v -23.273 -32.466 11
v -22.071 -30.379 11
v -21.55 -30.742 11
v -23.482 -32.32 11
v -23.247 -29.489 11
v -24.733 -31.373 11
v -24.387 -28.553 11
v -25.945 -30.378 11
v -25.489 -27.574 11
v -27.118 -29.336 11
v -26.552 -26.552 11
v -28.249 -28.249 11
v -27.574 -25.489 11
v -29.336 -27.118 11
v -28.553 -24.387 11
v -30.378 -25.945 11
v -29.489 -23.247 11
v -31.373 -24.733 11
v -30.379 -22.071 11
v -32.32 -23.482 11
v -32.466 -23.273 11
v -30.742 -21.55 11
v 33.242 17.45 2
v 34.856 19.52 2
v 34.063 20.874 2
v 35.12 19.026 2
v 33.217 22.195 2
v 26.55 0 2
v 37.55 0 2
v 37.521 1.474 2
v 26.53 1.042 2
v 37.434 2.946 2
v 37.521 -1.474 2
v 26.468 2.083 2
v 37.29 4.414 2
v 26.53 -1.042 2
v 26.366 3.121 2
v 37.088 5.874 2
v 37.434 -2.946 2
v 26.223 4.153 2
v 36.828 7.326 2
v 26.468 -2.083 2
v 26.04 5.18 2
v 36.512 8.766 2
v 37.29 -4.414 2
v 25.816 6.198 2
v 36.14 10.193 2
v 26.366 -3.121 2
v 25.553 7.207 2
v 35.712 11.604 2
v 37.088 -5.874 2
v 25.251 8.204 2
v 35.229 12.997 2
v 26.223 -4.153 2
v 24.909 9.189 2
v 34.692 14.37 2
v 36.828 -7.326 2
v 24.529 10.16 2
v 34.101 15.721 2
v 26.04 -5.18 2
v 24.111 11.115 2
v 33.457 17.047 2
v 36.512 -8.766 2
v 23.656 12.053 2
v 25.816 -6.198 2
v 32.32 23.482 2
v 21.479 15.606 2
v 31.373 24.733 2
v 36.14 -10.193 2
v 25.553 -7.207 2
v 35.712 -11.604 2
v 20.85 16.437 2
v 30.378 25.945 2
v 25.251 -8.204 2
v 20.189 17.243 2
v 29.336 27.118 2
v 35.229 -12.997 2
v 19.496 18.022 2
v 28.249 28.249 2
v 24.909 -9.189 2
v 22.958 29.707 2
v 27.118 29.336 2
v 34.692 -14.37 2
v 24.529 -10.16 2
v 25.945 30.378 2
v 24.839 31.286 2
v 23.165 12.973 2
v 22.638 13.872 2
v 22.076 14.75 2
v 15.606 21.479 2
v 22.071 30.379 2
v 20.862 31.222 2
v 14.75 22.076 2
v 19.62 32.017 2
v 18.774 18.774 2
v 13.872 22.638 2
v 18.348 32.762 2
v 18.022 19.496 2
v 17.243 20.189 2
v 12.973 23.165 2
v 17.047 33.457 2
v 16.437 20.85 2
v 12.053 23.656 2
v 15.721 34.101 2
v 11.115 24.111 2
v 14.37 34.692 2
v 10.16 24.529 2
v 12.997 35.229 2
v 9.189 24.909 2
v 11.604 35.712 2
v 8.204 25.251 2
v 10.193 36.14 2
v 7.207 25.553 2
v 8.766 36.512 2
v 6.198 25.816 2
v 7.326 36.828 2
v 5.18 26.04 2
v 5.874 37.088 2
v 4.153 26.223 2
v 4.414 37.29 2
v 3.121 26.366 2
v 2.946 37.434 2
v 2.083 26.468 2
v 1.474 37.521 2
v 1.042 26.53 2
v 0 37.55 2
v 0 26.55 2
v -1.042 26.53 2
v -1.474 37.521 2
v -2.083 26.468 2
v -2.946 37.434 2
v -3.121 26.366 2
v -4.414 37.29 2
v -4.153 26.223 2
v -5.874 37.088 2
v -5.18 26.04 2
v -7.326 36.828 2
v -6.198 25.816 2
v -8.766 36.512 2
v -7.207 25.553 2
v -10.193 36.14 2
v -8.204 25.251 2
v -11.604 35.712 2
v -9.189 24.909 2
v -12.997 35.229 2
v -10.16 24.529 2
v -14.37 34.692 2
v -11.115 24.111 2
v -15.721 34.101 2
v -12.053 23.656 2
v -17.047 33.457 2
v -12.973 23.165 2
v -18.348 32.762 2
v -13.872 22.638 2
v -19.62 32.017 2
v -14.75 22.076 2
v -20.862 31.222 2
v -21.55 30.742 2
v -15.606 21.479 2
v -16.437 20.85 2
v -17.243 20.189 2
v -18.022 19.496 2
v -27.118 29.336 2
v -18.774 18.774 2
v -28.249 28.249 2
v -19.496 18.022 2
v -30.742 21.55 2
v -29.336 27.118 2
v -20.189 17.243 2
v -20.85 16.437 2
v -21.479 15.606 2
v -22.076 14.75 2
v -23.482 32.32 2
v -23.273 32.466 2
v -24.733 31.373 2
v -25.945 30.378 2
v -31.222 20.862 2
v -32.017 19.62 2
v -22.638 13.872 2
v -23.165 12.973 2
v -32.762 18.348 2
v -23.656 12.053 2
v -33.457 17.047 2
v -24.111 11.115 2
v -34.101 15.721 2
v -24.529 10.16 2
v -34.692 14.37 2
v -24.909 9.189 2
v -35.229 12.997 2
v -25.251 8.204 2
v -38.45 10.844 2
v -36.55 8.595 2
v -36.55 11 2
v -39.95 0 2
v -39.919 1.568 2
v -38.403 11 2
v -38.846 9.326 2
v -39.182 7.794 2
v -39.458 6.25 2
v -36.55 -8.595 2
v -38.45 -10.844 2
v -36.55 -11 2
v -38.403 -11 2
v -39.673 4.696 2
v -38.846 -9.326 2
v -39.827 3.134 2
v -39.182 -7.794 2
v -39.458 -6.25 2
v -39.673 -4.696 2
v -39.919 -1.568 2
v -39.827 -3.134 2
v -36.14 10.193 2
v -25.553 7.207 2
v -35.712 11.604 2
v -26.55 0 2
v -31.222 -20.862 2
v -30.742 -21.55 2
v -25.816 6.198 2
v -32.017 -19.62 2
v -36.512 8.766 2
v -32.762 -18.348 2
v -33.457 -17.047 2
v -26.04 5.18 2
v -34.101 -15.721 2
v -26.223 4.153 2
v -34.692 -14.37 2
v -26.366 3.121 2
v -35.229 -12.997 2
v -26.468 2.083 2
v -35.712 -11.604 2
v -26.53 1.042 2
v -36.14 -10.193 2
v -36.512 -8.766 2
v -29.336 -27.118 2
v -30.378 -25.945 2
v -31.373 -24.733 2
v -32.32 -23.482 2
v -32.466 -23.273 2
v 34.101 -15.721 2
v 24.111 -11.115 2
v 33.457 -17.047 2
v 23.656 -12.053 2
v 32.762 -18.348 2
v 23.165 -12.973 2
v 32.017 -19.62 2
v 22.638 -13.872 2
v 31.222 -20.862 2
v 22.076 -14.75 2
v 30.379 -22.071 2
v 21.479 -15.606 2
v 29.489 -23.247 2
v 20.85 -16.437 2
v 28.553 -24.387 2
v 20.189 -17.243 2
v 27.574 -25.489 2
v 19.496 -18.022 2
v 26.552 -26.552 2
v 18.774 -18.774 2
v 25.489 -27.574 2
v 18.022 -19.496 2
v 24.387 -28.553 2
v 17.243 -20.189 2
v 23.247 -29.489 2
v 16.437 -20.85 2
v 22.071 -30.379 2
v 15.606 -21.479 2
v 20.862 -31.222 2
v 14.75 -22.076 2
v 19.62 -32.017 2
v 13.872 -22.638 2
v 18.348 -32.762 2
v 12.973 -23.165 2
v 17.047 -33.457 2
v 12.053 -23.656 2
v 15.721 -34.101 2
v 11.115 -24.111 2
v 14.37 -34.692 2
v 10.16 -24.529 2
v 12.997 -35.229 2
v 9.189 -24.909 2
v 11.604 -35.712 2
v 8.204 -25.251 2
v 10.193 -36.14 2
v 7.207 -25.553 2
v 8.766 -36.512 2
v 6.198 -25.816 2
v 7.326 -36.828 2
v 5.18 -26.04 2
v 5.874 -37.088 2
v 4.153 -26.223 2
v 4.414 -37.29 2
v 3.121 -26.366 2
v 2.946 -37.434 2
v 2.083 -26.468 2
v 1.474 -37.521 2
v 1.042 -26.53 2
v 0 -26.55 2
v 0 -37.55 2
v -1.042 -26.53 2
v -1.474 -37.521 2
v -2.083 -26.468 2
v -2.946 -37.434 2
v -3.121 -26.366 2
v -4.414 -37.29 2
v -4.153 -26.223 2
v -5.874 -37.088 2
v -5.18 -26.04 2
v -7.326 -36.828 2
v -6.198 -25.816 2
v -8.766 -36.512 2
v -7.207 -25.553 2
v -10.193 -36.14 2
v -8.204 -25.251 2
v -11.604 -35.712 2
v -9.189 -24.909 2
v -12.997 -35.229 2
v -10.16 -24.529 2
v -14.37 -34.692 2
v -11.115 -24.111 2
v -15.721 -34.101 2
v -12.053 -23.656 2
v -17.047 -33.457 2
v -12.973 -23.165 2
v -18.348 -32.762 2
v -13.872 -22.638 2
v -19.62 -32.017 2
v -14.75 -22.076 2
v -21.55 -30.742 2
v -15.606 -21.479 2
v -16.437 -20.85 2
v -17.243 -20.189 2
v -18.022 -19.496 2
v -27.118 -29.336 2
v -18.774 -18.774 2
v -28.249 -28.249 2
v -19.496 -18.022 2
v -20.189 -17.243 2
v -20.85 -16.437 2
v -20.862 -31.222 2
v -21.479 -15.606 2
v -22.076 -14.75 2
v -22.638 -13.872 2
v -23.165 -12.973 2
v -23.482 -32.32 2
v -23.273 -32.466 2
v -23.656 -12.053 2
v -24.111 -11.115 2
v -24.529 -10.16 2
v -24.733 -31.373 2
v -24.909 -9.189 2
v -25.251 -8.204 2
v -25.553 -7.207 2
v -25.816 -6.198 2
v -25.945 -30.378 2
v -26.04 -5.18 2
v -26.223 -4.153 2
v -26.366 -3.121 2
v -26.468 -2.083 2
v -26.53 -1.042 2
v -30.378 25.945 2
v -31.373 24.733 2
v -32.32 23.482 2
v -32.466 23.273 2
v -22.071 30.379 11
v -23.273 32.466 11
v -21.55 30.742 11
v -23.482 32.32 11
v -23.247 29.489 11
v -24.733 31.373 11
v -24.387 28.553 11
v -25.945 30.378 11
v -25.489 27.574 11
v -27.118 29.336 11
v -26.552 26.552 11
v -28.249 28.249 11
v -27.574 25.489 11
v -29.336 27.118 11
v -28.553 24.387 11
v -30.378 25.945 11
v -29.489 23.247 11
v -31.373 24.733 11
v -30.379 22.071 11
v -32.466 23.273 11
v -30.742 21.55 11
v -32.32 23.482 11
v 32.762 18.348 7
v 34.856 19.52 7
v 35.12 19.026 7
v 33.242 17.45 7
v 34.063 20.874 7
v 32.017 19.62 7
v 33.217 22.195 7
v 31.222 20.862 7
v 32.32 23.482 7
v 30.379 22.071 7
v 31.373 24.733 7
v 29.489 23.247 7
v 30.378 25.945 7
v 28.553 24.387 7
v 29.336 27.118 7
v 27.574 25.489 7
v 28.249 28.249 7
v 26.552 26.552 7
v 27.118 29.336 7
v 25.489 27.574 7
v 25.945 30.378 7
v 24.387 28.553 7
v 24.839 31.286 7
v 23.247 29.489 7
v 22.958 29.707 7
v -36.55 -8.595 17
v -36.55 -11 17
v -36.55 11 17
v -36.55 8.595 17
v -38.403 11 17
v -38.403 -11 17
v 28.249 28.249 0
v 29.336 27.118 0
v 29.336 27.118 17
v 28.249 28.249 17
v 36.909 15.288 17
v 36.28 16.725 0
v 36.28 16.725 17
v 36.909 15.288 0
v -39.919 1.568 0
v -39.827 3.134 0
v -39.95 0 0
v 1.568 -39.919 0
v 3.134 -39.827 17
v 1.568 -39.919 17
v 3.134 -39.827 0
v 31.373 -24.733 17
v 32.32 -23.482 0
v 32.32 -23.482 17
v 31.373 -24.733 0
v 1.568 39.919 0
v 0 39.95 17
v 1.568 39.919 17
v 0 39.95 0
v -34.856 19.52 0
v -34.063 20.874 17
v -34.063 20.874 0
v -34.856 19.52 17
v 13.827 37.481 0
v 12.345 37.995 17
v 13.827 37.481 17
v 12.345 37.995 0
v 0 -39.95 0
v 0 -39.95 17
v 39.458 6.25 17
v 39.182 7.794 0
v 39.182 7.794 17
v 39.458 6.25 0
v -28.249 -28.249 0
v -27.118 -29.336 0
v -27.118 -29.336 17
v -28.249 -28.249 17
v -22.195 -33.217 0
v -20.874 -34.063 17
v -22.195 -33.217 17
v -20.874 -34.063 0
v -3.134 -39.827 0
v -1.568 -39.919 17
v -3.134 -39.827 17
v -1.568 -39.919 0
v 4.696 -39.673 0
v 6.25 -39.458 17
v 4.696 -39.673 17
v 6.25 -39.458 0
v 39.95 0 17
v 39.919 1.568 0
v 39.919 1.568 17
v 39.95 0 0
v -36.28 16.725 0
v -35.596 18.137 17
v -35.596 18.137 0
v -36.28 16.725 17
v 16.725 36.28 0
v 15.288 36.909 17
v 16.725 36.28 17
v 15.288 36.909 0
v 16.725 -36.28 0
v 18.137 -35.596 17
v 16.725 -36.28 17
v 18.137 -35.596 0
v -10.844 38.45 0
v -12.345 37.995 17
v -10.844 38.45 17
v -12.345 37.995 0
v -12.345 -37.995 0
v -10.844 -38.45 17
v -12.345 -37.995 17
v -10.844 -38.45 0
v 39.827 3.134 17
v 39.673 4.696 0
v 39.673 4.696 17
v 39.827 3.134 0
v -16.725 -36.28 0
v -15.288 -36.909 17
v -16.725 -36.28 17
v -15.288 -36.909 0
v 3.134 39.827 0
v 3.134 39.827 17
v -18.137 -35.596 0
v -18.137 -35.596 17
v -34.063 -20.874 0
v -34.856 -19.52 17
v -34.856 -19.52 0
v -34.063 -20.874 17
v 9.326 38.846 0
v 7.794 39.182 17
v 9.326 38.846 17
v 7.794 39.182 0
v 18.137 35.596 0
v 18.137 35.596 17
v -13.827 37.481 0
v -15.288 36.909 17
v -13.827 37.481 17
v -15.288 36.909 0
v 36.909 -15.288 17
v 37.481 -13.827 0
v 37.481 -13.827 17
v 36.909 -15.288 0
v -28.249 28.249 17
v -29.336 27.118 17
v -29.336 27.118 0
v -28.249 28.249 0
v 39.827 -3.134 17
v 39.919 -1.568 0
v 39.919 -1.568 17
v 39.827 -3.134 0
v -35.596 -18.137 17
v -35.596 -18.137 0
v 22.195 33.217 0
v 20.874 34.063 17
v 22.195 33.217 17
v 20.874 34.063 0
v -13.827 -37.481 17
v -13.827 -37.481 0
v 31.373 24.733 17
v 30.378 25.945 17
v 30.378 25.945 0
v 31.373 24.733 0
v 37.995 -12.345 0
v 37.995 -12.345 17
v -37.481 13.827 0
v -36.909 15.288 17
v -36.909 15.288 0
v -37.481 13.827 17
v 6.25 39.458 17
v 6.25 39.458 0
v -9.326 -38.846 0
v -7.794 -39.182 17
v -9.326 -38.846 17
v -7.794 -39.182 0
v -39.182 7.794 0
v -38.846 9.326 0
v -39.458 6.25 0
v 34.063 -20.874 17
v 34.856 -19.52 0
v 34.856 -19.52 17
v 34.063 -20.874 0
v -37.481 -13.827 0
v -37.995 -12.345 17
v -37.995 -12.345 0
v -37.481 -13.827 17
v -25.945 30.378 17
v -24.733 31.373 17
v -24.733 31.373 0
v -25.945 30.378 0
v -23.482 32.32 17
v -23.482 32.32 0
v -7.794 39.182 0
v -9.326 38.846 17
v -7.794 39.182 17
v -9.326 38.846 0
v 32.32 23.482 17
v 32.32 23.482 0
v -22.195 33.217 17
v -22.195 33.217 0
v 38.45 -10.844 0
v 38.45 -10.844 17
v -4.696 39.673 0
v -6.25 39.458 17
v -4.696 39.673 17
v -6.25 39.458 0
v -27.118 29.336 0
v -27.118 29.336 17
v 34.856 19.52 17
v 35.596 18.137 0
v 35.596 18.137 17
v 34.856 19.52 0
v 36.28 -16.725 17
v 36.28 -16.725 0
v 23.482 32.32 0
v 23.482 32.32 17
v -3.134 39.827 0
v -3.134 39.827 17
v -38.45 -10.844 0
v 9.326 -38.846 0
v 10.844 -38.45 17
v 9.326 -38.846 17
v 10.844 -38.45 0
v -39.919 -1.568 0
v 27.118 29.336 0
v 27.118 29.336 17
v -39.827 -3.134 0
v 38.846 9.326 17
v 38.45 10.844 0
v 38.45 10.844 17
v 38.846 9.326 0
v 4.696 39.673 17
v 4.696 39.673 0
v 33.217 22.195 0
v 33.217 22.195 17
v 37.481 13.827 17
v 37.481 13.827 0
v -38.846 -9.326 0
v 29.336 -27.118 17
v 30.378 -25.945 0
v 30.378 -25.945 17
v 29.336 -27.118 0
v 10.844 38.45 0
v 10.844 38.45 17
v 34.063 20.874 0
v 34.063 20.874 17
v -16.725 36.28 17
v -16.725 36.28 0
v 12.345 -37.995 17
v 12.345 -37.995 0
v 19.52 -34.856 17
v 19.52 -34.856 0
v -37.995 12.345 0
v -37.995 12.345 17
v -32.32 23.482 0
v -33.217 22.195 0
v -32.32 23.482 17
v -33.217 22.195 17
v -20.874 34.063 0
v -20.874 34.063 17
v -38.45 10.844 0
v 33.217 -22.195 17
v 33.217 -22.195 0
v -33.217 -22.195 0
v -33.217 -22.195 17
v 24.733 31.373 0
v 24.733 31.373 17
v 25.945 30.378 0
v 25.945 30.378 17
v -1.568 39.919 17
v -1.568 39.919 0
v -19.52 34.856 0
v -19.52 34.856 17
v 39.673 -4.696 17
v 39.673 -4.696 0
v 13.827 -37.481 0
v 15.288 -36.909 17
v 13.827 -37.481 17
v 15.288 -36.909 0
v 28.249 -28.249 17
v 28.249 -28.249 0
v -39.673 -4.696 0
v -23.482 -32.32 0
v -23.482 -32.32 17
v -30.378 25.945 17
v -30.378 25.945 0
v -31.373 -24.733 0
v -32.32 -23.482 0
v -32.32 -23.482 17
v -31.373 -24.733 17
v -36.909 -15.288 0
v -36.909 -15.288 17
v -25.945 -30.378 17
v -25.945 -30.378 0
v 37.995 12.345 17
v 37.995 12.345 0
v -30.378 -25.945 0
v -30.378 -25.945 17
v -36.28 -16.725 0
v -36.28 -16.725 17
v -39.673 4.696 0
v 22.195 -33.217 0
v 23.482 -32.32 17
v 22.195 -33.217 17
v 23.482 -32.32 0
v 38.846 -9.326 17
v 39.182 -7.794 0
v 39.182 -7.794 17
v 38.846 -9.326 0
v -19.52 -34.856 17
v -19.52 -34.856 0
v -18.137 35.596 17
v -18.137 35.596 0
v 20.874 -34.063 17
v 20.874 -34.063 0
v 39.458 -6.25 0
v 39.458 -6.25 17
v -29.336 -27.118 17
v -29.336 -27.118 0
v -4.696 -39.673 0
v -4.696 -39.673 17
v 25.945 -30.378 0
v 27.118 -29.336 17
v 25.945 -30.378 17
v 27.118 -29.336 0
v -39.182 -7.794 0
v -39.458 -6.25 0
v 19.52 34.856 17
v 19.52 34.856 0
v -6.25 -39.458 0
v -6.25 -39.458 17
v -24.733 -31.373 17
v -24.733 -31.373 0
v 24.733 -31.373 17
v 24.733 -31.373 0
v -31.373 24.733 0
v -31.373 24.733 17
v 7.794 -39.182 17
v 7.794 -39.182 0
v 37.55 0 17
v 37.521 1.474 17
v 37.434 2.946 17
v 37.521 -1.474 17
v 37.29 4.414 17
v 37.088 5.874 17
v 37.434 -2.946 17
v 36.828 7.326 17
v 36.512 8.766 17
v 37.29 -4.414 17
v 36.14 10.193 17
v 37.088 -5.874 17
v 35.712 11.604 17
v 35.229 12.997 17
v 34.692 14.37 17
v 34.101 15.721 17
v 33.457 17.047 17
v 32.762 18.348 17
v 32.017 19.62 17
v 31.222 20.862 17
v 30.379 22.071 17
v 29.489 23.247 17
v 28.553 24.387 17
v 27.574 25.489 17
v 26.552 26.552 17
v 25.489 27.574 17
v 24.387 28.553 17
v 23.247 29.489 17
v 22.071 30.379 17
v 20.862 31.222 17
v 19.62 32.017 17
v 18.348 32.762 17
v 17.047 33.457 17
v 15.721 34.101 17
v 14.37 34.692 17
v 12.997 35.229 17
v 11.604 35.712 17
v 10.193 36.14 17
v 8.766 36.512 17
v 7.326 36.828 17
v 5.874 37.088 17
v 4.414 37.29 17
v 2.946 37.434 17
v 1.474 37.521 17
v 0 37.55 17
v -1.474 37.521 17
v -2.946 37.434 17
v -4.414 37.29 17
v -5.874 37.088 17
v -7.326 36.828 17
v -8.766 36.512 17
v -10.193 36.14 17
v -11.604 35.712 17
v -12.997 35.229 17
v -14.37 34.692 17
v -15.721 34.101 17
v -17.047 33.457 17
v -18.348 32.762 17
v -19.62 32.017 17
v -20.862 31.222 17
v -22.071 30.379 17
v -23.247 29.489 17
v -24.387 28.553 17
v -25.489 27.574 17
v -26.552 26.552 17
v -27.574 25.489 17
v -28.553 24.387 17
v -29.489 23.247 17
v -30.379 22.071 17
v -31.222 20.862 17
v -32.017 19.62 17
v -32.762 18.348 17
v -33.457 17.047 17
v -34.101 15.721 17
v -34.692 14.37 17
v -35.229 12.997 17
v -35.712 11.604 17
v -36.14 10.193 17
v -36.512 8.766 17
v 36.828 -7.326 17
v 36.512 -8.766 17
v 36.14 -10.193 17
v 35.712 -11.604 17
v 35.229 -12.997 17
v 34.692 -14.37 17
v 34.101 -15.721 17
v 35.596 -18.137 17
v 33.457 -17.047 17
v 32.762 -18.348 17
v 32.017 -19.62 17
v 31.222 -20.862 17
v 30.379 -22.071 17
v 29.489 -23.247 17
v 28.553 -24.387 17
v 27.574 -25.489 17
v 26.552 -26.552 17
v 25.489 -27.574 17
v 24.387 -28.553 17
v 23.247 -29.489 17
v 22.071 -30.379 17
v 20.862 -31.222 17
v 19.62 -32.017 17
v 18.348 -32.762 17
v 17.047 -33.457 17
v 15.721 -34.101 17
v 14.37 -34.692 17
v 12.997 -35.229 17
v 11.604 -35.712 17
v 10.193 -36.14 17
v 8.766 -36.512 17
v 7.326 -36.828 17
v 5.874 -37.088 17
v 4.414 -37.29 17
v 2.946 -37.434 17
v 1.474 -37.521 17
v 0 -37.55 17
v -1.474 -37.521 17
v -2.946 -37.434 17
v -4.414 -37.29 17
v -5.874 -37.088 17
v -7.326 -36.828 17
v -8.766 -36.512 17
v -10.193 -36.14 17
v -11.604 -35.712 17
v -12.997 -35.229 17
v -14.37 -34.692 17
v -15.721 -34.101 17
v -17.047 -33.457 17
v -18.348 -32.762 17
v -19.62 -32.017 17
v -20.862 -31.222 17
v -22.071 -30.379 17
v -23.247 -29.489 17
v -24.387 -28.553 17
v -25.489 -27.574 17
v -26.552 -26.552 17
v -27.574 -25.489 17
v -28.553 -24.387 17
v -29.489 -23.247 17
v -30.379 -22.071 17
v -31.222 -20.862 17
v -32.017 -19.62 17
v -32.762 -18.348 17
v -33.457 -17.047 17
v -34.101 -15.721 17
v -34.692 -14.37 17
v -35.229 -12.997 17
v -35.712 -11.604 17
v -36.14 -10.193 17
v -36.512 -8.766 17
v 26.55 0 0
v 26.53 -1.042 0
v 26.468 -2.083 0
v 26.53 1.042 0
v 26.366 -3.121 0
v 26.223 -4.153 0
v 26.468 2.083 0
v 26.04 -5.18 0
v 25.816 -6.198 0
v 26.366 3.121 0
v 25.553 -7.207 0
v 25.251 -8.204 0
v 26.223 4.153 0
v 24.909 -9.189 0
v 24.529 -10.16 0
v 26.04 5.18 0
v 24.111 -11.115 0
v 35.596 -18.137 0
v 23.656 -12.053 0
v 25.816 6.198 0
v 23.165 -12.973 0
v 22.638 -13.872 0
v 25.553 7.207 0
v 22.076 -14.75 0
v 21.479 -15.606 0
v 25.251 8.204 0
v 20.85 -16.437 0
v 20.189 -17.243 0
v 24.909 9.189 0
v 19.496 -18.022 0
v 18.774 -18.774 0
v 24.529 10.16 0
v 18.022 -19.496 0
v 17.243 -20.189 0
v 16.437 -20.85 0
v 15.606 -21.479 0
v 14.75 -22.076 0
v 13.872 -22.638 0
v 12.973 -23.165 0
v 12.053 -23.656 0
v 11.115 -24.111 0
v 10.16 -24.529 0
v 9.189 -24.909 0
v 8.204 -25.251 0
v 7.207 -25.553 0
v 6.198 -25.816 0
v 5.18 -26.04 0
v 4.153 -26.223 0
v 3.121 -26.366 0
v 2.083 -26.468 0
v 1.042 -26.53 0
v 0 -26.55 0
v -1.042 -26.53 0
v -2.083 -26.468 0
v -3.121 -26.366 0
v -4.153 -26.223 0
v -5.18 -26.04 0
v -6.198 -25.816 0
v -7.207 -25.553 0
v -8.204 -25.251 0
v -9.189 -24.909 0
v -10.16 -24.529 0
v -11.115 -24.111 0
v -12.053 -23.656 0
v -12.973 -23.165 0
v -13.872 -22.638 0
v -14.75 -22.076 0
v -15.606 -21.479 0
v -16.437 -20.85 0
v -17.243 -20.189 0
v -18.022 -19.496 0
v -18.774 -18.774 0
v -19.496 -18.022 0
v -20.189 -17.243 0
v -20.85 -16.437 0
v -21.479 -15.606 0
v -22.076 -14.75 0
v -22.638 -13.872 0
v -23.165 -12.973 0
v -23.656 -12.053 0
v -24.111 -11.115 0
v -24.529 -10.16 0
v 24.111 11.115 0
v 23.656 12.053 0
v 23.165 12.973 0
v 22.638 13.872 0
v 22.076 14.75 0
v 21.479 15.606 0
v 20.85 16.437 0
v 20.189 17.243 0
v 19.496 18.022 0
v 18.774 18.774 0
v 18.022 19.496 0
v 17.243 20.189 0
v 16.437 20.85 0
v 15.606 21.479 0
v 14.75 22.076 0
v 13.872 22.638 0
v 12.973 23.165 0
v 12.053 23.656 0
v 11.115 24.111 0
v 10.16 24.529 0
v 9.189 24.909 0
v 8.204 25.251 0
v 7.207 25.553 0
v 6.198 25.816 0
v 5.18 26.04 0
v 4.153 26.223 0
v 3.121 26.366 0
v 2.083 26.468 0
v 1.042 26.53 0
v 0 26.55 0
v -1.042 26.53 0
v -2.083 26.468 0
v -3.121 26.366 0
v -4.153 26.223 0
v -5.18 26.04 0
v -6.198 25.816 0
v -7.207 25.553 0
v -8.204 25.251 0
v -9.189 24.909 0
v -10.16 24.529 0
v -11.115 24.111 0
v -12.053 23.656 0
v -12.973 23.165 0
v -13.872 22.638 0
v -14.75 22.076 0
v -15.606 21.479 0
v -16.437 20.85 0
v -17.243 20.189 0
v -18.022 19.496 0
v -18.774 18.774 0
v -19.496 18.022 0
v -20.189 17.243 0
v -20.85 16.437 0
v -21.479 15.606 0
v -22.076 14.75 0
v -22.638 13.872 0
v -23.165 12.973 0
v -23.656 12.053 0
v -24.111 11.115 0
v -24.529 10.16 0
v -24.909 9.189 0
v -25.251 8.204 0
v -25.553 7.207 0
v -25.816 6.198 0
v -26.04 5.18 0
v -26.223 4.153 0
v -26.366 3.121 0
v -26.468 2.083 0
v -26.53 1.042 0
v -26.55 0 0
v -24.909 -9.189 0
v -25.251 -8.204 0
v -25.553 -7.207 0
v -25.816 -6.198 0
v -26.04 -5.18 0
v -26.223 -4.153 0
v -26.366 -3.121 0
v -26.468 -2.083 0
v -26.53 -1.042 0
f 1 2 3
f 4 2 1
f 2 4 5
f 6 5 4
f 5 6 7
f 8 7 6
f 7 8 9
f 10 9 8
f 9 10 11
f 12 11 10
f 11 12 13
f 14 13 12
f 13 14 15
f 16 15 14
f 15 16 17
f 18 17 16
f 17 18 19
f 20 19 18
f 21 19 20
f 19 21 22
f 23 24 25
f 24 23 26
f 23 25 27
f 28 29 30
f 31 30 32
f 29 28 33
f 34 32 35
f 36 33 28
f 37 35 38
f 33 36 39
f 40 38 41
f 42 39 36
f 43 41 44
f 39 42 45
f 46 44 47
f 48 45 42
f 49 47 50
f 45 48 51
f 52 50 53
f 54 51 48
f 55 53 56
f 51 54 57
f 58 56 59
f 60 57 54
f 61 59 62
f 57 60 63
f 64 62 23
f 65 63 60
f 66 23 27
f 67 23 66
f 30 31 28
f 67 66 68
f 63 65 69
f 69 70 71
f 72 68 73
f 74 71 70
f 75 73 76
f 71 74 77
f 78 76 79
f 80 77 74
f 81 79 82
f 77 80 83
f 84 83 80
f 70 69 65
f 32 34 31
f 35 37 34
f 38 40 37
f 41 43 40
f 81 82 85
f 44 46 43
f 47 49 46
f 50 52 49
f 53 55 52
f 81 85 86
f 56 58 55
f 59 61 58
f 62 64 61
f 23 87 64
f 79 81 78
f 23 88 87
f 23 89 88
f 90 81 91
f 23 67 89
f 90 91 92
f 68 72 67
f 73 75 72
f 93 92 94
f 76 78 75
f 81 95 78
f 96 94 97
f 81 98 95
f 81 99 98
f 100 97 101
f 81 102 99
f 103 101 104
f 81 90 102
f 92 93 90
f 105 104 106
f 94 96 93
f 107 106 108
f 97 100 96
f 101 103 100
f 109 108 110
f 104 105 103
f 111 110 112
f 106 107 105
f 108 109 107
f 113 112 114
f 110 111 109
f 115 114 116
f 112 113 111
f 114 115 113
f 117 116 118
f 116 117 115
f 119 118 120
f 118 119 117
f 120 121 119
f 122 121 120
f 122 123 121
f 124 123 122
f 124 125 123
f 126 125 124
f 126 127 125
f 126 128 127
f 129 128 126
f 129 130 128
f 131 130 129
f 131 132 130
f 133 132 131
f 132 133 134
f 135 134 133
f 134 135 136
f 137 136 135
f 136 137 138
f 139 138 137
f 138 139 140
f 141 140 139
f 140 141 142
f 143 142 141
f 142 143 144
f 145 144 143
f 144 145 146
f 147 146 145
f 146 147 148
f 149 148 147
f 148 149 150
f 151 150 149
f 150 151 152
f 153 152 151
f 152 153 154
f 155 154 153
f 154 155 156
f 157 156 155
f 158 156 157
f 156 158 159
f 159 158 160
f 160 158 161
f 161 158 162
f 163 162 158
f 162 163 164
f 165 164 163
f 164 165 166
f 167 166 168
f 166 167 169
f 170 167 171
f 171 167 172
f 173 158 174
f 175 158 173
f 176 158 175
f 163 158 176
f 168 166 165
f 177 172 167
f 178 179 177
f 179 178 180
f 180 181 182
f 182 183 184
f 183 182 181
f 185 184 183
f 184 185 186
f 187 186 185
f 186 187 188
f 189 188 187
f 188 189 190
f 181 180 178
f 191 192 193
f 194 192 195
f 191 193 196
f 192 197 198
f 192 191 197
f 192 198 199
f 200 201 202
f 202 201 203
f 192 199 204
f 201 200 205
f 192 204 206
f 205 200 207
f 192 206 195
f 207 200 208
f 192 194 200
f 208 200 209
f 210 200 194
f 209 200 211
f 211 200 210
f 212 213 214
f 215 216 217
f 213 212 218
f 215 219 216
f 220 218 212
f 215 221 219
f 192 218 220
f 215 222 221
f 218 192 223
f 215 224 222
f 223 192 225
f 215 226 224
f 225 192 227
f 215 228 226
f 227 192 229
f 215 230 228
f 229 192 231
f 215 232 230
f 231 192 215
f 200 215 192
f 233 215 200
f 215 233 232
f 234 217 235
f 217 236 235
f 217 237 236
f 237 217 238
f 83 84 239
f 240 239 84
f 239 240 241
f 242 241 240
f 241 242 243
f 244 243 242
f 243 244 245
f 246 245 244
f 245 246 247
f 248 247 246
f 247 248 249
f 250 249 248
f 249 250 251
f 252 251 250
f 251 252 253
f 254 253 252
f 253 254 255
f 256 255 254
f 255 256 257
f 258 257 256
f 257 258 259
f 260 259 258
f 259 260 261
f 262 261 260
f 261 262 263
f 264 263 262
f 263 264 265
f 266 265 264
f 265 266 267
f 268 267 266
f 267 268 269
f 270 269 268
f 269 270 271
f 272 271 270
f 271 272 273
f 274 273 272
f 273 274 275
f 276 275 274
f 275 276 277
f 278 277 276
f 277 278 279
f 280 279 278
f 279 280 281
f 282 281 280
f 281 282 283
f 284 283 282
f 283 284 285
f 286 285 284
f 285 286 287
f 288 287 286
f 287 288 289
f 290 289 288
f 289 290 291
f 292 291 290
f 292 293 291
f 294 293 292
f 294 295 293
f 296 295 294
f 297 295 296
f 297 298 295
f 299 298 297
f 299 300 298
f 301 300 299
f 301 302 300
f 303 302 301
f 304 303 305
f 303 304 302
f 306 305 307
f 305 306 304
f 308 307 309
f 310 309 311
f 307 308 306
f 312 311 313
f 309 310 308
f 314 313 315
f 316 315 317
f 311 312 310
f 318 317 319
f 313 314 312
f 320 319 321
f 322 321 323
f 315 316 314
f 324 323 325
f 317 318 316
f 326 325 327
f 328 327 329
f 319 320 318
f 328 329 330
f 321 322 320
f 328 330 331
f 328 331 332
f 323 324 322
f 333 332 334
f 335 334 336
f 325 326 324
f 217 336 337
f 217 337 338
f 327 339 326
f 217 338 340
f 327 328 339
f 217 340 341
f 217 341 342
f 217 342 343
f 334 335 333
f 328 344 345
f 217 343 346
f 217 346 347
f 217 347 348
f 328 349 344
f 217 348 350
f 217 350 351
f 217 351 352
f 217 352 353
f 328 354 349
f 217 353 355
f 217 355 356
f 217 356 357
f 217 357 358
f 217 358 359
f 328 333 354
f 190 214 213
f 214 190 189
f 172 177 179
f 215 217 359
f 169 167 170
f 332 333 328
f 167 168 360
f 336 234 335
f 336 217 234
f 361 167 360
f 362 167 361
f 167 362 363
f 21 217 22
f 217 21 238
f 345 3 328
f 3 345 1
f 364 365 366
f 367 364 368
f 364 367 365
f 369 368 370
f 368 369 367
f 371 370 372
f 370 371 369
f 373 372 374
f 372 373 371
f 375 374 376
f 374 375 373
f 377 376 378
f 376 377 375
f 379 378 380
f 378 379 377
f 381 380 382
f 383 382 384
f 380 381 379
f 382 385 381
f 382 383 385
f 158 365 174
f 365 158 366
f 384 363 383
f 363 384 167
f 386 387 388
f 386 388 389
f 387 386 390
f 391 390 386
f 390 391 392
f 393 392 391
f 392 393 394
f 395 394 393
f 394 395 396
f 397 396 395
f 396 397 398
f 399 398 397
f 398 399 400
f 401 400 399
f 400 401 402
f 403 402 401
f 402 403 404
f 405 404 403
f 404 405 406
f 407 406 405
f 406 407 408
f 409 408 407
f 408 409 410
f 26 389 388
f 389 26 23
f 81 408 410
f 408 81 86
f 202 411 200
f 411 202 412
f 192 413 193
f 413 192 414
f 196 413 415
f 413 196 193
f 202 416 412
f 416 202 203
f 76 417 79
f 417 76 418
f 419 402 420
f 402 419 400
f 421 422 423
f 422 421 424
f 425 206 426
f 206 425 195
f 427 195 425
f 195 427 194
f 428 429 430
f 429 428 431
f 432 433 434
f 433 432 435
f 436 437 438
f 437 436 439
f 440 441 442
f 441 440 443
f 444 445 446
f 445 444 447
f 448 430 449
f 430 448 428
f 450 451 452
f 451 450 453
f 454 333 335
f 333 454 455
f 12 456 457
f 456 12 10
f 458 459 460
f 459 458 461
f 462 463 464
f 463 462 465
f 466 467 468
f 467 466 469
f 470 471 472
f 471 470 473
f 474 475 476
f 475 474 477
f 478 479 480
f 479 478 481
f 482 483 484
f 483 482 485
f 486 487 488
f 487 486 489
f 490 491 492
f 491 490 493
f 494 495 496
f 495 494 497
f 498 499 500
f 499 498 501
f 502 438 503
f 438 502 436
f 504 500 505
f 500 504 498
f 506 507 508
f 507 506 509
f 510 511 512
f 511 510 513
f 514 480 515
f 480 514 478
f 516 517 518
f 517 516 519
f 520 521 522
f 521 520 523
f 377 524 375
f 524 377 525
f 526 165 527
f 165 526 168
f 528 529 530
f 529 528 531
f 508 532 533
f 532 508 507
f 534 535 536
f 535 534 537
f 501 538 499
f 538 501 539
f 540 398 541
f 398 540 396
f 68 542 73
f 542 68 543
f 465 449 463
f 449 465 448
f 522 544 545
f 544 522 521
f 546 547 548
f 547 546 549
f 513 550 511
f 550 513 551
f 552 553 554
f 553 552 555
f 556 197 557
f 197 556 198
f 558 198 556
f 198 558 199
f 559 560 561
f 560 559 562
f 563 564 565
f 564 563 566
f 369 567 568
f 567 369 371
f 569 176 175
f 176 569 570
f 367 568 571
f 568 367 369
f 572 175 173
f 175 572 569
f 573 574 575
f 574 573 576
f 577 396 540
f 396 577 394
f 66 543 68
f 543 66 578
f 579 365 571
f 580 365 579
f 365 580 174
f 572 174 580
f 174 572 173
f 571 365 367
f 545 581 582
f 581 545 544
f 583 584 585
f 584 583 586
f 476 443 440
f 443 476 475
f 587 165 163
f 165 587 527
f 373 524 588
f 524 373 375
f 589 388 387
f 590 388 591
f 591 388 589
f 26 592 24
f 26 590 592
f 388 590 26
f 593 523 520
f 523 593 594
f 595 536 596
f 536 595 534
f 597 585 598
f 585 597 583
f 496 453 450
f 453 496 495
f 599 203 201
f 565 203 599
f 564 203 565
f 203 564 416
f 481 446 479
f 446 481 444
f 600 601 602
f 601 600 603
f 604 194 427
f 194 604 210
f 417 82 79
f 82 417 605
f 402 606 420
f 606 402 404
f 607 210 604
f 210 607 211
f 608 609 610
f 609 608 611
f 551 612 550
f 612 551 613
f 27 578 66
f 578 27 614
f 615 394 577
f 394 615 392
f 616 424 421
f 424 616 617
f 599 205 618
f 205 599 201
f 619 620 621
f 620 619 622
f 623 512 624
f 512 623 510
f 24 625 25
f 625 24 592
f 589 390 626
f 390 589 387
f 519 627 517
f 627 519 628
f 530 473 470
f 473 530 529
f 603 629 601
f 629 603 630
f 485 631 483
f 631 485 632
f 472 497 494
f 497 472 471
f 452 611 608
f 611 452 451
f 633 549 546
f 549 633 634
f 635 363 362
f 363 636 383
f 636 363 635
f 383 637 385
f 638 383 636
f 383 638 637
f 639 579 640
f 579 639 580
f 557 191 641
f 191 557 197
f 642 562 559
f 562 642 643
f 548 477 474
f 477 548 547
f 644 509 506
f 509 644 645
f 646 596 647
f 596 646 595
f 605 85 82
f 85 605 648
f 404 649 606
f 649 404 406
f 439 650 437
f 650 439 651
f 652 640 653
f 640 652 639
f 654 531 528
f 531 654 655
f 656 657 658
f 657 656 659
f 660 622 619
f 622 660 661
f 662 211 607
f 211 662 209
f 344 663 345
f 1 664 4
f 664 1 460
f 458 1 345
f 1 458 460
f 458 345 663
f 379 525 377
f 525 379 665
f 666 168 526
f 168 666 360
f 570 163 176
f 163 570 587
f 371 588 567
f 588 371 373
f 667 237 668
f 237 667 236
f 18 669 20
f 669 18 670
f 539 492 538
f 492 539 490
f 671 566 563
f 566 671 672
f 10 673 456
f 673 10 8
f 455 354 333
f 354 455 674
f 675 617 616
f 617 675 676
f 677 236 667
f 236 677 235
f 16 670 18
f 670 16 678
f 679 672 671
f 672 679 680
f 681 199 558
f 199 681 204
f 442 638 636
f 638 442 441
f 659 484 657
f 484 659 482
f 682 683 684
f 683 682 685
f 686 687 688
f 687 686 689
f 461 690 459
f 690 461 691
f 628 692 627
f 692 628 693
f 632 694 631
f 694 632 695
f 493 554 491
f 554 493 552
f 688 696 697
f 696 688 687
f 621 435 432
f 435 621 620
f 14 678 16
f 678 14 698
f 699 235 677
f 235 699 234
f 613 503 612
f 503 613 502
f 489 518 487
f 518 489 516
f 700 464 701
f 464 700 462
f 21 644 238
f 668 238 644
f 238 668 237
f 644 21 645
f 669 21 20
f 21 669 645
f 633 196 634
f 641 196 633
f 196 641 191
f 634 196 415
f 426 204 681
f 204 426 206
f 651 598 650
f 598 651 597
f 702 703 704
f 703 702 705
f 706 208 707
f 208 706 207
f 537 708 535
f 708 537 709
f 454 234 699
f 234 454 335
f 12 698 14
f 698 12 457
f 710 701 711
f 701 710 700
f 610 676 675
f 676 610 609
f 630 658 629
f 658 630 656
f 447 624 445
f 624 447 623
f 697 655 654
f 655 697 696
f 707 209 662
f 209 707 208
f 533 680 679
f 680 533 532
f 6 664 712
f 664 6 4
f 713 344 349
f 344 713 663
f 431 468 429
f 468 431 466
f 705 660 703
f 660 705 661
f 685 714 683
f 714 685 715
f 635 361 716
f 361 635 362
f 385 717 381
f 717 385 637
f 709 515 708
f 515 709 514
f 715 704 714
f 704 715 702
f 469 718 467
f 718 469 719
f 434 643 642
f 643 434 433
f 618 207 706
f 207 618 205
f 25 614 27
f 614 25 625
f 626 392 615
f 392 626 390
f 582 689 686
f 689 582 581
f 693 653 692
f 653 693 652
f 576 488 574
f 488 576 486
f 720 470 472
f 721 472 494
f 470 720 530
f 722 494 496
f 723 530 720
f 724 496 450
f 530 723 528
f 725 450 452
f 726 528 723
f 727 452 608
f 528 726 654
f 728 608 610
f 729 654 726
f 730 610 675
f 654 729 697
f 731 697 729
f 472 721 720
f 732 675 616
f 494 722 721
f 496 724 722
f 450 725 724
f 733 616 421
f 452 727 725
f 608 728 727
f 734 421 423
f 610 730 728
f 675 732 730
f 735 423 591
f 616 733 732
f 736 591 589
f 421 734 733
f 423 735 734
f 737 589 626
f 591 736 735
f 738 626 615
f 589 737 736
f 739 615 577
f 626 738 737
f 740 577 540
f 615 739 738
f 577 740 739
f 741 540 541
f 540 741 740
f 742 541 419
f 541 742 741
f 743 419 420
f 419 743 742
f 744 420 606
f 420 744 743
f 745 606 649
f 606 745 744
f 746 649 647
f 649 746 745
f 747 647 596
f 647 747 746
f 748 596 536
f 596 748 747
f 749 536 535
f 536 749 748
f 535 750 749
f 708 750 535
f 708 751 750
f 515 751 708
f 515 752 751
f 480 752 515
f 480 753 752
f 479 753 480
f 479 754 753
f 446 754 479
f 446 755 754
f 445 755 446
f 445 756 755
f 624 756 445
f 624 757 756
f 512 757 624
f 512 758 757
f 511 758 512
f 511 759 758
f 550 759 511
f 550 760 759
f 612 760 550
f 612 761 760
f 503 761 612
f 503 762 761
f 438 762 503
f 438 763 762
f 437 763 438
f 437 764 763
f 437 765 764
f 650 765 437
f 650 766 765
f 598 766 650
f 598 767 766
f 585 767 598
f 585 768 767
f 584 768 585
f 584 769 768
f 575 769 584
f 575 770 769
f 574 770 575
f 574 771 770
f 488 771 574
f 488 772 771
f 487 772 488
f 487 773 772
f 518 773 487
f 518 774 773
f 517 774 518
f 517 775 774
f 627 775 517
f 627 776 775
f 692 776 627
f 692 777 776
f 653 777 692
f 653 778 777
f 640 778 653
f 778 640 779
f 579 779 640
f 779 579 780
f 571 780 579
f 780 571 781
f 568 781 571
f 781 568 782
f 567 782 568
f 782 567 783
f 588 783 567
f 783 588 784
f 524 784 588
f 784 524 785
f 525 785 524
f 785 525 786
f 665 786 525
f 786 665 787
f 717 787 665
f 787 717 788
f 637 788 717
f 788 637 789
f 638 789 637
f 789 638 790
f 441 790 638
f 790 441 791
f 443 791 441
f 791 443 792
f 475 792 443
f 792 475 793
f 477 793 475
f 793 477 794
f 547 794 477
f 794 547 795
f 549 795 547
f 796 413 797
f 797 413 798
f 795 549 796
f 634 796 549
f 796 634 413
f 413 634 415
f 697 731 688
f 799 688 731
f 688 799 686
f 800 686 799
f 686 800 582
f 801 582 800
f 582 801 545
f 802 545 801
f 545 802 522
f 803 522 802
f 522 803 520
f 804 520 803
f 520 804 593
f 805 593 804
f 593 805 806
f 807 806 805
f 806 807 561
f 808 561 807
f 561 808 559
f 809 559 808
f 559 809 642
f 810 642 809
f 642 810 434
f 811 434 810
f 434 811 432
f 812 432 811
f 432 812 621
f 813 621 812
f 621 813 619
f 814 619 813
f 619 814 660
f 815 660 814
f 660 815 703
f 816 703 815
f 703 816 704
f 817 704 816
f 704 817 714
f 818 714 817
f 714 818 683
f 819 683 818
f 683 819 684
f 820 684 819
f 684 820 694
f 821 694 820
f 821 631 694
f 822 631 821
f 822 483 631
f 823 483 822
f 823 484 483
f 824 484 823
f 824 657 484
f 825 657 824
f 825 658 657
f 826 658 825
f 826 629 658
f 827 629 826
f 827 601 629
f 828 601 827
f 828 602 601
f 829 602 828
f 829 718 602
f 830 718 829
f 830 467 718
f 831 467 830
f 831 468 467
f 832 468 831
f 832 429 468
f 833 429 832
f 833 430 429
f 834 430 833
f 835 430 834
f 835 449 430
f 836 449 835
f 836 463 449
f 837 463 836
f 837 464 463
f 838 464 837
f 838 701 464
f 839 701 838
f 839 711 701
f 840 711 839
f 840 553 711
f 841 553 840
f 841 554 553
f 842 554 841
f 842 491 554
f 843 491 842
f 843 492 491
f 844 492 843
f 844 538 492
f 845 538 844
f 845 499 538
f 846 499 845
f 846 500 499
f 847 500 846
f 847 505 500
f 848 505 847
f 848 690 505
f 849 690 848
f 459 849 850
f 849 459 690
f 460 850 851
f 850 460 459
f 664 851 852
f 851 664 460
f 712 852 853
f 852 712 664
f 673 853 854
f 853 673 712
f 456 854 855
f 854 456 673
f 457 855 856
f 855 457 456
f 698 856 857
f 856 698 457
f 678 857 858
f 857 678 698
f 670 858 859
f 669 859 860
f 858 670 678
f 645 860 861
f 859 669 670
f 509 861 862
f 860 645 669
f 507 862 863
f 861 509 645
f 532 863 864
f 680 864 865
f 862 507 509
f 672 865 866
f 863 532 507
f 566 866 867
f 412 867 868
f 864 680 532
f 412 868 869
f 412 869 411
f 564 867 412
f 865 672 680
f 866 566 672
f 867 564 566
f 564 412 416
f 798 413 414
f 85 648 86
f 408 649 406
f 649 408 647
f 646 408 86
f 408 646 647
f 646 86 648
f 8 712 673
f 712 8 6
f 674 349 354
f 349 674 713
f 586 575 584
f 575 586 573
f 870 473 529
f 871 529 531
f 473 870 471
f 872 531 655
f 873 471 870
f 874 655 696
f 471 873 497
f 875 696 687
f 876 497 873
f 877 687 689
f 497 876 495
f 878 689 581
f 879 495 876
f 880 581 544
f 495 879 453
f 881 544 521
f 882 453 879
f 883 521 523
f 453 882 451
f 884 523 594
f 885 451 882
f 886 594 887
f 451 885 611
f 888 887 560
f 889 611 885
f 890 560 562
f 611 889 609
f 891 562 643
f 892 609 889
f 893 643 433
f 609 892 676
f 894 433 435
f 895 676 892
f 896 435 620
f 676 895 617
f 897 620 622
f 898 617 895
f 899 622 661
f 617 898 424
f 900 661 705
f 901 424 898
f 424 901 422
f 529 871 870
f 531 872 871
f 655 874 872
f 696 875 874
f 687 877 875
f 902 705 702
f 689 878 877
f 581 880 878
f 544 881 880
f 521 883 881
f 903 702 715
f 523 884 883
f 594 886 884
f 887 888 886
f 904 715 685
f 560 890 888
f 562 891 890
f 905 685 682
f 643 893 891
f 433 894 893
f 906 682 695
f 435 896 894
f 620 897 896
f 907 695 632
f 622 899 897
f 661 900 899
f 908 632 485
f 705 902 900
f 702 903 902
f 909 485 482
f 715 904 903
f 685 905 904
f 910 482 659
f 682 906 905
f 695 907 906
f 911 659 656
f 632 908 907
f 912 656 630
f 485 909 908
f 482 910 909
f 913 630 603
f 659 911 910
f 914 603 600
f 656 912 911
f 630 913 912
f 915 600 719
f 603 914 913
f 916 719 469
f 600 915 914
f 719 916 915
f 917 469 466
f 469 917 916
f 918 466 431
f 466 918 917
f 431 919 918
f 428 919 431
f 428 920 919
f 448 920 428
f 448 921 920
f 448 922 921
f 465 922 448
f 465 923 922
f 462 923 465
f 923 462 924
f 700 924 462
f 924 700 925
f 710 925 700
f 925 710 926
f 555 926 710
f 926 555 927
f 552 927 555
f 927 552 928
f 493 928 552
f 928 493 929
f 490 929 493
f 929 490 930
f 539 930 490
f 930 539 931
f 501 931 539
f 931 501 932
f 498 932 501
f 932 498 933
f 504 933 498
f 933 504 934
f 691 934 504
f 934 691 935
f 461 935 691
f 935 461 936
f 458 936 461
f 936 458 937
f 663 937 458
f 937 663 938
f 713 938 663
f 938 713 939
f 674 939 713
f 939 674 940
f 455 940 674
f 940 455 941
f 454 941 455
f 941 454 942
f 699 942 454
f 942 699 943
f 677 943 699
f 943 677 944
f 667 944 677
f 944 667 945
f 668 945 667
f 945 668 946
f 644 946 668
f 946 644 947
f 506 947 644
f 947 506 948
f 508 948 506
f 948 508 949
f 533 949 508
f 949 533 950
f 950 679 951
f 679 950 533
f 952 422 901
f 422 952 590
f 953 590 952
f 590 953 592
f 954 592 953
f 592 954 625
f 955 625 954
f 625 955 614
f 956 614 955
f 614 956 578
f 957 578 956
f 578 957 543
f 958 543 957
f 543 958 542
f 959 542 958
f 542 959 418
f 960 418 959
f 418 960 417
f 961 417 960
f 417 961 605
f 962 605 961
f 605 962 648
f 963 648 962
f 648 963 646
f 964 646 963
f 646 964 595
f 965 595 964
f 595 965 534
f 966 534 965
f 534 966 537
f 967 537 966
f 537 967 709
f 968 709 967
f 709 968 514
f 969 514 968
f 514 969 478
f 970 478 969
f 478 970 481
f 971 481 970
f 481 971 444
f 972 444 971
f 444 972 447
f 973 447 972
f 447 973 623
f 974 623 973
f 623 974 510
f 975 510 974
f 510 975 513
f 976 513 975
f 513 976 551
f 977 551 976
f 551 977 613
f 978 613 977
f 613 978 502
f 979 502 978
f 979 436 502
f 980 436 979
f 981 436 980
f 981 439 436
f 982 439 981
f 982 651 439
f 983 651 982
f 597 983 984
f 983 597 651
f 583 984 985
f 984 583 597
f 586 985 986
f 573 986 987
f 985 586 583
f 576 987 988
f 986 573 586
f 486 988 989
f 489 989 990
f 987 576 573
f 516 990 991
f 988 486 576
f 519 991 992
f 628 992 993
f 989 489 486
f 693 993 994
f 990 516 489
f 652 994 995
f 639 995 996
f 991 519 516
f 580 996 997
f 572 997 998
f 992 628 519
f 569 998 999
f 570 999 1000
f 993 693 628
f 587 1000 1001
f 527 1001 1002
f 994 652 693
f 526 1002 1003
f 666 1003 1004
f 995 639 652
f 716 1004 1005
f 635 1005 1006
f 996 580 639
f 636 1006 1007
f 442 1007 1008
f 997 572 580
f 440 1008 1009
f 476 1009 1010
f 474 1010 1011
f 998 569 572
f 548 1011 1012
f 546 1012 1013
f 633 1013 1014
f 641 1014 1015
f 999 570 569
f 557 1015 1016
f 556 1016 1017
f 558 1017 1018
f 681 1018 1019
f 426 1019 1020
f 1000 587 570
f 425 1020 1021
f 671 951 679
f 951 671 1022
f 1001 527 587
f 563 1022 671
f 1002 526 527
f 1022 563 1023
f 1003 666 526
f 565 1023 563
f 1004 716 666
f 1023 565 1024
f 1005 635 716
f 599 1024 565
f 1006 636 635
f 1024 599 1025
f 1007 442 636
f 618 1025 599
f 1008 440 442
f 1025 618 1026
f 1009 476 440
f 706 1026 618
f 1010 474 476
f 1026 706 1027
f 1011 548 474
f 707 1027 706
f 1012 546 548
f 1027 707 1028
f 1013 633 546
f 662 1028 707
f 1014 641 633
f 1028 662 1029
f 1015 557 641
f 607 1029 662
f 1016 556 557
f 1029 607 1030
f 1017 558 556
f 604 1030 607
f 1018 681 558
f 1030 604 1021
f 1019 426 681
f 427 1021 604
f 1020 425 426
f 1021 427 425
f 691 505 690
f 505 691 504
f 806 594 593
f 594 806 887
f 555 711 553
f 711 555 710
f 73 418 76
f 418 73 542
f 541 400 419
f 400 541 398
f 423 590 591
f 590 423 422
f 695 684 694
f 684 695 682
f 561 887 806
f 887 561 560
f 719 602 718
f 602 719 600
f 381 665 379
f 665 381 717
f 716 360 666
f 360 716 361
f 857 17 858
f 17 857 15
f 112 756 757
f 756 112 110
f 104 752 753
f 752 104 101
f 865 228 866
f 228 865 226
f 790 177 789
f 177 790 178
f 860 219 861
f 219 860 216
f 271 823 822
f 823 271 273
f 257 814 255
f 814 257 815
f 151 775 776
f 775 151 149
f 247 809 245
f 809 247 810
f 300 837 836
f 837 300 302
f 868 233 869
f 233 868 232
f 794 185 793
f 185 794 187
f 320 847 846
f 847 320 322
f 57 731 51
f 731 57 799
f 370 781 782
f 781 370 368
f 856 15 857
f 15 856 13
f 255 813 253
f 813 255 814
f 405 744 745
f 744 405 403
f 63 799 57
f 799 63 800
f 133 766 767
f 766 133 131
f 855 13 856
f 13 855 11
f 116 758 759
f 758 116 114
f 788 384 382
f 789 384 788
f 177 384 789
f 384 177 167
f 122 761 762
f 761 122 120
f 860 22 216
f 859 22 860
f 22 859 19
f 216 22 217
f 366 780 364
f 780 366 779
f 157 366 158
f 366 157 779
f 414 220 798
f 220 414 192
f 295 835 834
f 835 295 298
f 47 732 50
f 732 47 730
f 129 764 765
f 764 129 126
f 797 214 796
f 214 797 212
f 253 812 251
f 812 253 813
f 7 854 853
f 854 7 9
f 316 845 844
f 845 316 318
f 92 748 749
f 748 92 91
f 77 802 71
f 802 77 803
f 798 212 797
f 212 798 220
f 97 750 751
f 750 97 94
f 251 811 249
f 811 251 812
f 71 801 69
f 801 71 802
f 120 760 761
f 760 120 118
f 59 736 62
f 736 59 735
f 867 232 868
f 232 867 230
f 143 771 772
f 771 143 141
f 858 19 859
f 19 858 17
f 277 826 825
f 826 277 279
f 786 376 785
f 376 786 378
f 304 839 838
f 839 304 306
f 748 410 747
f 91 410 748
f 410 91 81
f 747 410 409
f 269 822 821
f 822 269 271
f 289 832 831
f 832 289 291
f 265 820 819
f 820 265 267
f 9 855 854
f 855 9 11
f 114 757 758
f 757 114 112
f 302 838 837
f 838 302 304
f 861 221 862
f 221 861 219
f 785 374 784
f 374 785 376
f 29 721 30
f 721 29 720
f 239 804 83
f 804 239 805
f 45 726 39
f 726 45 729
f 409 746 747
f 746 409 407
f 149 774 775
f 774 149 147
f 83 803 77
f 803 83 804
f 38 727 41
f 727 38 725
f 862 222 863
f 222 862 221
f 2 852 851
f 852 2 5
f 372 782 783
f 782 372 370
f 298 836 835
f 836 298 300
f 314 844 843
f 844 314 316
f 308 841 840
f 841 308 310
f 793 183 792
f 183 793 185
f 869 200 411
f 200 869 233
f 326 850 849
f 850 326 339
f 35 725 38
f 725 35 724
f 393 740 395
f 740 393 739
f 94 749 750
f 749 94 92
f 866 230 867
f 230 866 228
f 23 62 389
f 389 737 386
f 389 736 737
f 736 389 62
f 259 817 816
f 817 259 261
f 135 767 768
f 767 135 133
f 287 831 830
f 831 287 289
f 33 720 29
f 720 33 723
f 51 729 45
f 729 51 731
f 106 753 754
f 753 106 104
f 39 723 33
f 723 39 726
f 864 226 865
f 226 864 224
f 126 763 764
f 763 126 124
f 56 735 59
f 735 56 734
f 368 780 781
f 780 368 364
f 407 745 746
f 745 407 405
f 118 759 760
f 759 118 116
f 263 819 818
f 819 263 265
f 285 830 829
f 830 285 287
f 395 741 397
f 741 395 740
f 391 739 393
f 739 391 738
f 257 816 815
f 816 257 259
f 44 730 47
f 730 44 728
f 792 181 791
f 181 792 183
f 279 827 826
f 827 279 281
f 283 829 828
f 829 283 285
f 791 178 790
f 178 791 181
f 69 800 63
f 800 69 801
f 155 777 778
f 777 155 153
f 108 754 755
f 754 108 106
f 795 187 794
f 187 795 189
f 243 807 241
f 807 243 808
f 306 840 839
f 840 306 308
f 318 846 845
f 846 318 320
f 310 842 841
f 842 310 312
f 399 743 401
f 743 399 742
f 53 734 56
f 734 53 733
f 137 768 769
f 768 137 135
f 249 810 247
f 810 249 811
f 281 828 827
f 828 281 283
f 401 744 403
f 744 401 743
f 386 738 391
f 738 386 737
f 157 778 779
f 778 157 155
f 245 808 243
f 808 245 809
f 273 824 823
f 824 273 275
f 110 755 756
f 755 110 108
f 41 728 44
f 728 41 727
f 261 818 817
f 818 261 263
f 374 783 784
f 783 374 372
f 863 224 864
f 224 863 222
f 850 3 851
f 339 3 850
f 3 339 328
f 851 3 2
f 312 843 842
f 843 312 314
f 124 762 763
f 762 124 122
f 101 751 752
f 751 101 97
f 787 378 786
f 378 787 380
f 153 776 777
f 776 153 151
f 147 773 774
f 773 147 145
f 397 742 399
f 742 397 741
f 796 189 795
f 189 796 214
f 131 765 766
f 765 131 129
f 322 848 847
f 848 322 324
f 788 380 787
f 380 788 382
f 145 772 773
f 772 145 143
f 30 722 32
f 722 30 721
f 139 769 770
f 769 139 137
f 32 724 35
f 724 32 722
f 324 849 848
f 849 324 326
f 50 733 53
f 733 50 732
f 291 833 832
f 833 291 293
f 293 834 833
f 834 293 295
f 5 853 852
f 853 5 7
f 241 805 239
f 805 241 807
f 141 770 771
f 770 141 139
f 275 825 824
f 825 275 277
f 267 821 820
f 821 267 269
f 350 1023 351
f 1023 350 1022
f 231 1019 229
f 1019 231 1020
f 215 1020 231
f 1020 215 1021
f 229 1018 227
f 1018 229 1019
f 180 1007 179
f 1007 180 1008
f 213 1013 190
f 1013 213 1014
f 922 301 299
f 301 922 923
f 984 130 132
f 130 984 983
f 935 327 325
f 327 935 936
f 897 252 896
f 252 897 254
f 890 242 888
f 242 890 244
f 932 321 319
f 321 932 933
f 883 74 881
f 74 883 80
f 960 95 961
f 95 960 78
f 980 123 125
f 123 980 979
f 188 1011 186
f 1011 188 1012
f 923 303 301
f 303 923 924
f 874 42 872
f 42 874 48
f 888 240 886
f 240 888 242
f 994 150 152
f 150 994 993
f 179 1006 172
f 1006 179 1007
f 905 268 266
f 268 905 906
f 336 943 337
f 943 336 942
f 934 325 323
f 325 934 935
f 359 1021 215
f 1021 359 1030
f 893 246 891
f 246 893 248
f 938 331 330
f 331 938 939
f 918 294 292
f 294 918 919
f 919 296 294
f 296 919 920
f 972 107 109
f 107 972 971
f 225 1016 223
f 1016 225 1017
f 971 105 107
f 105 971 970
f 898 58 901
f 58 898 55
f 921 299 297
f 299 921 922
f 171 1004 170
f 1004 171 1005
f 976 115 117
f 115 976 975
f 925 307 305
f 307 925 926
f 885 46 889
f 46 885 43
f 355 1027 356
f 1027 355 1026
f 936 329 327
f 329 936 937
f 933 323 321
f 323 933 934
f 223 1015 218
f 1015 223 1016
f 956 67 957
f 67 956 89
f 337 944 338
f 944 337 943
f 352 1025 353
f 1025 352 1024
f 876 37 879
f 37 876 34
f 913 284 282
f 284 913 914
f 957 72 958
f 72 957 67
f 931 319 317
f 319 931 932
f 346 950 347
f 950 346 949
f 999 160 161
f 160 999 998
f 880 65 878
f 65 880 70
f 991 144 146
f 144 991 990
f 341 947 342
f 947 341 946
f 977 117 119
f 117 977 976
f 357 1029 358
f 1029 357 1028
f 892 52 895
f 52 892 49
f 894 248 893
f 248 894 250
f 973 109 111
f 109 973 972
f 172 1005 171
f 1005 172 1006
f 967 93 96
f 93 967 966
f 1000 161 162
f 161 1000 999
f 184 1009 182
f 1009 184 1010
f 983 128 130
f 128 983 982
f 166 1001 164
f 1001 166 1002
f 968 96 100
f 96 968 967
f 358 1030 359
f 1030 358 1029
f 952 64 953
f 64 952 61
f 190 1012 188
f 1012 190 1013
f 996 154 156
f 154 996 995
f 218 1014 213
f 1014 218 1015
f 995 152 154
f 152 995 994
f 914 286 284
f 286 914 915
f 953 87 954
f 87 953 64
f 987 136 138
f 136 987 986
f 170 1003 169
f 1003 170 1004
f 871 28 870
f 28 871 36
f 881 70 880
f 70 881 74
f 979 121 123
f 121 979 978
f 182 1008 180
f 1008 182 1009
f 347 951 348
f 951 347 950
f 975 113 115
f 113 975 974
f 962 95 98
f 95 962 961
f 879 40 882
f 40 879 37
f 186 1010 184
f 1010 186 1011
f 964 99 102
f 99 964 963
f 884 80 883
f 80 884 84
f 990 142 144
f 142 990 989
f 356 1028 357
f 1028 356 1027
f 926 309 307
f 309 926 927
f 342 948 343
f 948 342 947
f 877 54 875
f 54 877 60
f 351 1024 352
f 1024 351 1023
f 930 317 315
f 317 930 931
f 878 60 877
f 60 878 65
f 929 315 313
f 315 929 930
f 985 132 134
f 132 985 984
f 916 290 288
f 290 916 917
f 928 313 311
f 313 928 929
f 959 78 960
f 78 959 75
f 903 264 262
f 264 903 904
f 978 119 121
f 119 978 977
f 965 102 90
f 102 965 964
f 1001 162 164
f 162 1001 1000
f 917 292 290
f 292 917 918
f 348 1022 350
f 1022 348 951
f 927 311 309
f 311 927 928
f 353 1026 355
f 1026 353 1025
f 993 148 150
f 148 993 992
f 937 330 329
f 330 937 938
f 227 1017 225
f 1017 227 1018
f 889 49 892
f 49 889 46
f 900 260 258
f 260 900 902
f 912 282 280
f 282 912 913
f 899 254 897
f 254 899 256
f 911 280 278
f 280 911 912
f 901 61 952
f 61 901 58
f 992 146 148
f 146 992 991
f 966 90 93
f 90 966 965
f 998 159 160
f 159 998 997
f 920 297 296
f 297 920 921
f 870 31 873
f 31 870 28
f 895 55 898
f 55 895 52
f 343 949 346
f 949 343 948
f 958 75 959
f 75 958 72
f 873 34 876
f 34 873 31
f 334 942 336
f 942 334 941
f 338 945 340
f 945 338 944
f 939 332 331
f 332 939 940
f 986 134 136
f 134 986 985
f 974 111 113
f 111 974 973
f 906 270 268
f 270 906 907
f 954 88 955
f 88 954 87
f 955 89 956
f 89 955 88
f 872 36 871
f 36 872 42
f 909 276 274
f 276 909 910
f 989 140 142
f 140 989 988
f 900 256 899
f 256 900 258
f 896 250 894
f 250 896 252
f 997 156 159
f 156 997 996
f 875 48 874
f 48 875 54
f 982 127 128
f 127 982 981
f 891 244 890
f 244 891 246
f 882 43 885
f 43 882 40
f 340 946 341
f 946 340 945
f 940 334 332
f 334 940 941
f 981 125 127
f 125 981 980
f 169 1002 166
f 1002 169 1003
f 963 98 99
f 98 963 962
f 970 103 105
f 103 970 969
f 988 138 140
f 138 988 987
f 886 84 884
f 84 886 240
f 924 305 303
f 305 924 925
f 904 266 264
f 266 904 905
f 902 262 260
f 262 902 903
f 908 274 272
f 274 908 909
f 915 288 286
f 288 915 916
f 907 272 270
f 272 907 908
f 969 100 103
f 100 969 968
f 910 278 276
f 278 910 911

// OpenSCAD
// Tape-on mount for the Waveshare ESP32-S3(-Touch)-LCD-2.8C round display.
// Two parts: a cup the board drops into (flat back for double-sided tape) and a
// front ring that presses over the cup to hold the screen in.
//
// Measure, then edit the numbers below. Print `part = "test"` first: a thin ring
// that checks the board diameter in a few minutes.
//
// Angles are measured looking at the BACK of the board (component side), with
// 0 = right, 90 = top, counter-clockwise positive.

part = "cup";            // "cup", "ring", "test", or "both" (preview)

board_d      = 74.5;     // board/screen outer diameter (widest point, excluding the ribbon tab)
board_t      = 15.0;     // screen glass to the tallest part on the back (USB plug excluded)
fit          = 0.6;      // extra diameter so the board drops in

wall         = 2.4;      // side wall thickness
back_t       = 2.0;      // back flange thickness
flange_w     = 11;       // width of the back flange (tape area); the center stays open
lip_w        = 2.2;      // how far the front ring overlaps the screen edge
lip_t        = 1.6;      // front ring face thickness
ring_skirt   = 5;        // how far the front ring slides over the cup
ring_fit     = 0.3;      // gap between ring and cup (raise if too tight)

// Cutouts in the side wall: [angle, width, height from back plate]
usb_cut      = [-45, 13, 9];   // USB-C cable (port labelled USB)
uart_cut     = [45, 13, 9];    // second USB-C (UART); set width to 0 to leave closed
sd_cut       = [140, 16, 5];   // microSD slot
ribbon_cut   = [0, 22, 99];    // display ribbon that wraps round the edge (full height)

$fn = 160;

inner_d = board_d + fit;
outer_d = inner_d + 2 * wall;
cup_h = back_t + board_t;

module wall_cut(c) {
    angle = c[0]; width = c[1]; height = c[2];
    if (width > 0)
        rotate([0, 0, angle])
            translate([inner_d / 2 - 1, -width / 2, back_t])
                cube([wall + 2, width, min(height, cup_h)]);
}

module cup() {
    mirror([1, 0, 0])
    difference() {
        cylinder(d = outer_d, h = cup_h);
        translate([0, 0, back_t]) cylinder(d = inner_d, h = cup_h);
        translate([0, 0, -1]) cylinder(d = inner_d - 2 * flange_w, h = back_t + 2);
        for (c = [usb_cut, uart_cut, sd_cut, ribbon_cut]) wall_cut(c);
    }
}

module ring() {
    difference() {
        cylinder(d = outer_d + 2 * ring_fit + 2 * wall, h = lip_t + ring_skirt);
        translate([0, 0, lip_t]) cylinder(d = outer_d + 2 * ring_fit, h = ring_skirt + 1);
        translate([0, 0, -1]) cylinder(d = board_d - 2 * lip_w, h = lip_t + 2);
    }
}

module test_ring() {
    difference() {
        cylinder(d = outer_d, h = 3);
        translate([0, 0, -1]) cylinder(d = inner_d, h = 5);
    }
}

if (part == "cup") cup();
else if (part == "ring") ring();
else if (part == "test") test_ring();
else {
    cup();
    translate([outer_d + 15, 0, 0]) ring();
}
